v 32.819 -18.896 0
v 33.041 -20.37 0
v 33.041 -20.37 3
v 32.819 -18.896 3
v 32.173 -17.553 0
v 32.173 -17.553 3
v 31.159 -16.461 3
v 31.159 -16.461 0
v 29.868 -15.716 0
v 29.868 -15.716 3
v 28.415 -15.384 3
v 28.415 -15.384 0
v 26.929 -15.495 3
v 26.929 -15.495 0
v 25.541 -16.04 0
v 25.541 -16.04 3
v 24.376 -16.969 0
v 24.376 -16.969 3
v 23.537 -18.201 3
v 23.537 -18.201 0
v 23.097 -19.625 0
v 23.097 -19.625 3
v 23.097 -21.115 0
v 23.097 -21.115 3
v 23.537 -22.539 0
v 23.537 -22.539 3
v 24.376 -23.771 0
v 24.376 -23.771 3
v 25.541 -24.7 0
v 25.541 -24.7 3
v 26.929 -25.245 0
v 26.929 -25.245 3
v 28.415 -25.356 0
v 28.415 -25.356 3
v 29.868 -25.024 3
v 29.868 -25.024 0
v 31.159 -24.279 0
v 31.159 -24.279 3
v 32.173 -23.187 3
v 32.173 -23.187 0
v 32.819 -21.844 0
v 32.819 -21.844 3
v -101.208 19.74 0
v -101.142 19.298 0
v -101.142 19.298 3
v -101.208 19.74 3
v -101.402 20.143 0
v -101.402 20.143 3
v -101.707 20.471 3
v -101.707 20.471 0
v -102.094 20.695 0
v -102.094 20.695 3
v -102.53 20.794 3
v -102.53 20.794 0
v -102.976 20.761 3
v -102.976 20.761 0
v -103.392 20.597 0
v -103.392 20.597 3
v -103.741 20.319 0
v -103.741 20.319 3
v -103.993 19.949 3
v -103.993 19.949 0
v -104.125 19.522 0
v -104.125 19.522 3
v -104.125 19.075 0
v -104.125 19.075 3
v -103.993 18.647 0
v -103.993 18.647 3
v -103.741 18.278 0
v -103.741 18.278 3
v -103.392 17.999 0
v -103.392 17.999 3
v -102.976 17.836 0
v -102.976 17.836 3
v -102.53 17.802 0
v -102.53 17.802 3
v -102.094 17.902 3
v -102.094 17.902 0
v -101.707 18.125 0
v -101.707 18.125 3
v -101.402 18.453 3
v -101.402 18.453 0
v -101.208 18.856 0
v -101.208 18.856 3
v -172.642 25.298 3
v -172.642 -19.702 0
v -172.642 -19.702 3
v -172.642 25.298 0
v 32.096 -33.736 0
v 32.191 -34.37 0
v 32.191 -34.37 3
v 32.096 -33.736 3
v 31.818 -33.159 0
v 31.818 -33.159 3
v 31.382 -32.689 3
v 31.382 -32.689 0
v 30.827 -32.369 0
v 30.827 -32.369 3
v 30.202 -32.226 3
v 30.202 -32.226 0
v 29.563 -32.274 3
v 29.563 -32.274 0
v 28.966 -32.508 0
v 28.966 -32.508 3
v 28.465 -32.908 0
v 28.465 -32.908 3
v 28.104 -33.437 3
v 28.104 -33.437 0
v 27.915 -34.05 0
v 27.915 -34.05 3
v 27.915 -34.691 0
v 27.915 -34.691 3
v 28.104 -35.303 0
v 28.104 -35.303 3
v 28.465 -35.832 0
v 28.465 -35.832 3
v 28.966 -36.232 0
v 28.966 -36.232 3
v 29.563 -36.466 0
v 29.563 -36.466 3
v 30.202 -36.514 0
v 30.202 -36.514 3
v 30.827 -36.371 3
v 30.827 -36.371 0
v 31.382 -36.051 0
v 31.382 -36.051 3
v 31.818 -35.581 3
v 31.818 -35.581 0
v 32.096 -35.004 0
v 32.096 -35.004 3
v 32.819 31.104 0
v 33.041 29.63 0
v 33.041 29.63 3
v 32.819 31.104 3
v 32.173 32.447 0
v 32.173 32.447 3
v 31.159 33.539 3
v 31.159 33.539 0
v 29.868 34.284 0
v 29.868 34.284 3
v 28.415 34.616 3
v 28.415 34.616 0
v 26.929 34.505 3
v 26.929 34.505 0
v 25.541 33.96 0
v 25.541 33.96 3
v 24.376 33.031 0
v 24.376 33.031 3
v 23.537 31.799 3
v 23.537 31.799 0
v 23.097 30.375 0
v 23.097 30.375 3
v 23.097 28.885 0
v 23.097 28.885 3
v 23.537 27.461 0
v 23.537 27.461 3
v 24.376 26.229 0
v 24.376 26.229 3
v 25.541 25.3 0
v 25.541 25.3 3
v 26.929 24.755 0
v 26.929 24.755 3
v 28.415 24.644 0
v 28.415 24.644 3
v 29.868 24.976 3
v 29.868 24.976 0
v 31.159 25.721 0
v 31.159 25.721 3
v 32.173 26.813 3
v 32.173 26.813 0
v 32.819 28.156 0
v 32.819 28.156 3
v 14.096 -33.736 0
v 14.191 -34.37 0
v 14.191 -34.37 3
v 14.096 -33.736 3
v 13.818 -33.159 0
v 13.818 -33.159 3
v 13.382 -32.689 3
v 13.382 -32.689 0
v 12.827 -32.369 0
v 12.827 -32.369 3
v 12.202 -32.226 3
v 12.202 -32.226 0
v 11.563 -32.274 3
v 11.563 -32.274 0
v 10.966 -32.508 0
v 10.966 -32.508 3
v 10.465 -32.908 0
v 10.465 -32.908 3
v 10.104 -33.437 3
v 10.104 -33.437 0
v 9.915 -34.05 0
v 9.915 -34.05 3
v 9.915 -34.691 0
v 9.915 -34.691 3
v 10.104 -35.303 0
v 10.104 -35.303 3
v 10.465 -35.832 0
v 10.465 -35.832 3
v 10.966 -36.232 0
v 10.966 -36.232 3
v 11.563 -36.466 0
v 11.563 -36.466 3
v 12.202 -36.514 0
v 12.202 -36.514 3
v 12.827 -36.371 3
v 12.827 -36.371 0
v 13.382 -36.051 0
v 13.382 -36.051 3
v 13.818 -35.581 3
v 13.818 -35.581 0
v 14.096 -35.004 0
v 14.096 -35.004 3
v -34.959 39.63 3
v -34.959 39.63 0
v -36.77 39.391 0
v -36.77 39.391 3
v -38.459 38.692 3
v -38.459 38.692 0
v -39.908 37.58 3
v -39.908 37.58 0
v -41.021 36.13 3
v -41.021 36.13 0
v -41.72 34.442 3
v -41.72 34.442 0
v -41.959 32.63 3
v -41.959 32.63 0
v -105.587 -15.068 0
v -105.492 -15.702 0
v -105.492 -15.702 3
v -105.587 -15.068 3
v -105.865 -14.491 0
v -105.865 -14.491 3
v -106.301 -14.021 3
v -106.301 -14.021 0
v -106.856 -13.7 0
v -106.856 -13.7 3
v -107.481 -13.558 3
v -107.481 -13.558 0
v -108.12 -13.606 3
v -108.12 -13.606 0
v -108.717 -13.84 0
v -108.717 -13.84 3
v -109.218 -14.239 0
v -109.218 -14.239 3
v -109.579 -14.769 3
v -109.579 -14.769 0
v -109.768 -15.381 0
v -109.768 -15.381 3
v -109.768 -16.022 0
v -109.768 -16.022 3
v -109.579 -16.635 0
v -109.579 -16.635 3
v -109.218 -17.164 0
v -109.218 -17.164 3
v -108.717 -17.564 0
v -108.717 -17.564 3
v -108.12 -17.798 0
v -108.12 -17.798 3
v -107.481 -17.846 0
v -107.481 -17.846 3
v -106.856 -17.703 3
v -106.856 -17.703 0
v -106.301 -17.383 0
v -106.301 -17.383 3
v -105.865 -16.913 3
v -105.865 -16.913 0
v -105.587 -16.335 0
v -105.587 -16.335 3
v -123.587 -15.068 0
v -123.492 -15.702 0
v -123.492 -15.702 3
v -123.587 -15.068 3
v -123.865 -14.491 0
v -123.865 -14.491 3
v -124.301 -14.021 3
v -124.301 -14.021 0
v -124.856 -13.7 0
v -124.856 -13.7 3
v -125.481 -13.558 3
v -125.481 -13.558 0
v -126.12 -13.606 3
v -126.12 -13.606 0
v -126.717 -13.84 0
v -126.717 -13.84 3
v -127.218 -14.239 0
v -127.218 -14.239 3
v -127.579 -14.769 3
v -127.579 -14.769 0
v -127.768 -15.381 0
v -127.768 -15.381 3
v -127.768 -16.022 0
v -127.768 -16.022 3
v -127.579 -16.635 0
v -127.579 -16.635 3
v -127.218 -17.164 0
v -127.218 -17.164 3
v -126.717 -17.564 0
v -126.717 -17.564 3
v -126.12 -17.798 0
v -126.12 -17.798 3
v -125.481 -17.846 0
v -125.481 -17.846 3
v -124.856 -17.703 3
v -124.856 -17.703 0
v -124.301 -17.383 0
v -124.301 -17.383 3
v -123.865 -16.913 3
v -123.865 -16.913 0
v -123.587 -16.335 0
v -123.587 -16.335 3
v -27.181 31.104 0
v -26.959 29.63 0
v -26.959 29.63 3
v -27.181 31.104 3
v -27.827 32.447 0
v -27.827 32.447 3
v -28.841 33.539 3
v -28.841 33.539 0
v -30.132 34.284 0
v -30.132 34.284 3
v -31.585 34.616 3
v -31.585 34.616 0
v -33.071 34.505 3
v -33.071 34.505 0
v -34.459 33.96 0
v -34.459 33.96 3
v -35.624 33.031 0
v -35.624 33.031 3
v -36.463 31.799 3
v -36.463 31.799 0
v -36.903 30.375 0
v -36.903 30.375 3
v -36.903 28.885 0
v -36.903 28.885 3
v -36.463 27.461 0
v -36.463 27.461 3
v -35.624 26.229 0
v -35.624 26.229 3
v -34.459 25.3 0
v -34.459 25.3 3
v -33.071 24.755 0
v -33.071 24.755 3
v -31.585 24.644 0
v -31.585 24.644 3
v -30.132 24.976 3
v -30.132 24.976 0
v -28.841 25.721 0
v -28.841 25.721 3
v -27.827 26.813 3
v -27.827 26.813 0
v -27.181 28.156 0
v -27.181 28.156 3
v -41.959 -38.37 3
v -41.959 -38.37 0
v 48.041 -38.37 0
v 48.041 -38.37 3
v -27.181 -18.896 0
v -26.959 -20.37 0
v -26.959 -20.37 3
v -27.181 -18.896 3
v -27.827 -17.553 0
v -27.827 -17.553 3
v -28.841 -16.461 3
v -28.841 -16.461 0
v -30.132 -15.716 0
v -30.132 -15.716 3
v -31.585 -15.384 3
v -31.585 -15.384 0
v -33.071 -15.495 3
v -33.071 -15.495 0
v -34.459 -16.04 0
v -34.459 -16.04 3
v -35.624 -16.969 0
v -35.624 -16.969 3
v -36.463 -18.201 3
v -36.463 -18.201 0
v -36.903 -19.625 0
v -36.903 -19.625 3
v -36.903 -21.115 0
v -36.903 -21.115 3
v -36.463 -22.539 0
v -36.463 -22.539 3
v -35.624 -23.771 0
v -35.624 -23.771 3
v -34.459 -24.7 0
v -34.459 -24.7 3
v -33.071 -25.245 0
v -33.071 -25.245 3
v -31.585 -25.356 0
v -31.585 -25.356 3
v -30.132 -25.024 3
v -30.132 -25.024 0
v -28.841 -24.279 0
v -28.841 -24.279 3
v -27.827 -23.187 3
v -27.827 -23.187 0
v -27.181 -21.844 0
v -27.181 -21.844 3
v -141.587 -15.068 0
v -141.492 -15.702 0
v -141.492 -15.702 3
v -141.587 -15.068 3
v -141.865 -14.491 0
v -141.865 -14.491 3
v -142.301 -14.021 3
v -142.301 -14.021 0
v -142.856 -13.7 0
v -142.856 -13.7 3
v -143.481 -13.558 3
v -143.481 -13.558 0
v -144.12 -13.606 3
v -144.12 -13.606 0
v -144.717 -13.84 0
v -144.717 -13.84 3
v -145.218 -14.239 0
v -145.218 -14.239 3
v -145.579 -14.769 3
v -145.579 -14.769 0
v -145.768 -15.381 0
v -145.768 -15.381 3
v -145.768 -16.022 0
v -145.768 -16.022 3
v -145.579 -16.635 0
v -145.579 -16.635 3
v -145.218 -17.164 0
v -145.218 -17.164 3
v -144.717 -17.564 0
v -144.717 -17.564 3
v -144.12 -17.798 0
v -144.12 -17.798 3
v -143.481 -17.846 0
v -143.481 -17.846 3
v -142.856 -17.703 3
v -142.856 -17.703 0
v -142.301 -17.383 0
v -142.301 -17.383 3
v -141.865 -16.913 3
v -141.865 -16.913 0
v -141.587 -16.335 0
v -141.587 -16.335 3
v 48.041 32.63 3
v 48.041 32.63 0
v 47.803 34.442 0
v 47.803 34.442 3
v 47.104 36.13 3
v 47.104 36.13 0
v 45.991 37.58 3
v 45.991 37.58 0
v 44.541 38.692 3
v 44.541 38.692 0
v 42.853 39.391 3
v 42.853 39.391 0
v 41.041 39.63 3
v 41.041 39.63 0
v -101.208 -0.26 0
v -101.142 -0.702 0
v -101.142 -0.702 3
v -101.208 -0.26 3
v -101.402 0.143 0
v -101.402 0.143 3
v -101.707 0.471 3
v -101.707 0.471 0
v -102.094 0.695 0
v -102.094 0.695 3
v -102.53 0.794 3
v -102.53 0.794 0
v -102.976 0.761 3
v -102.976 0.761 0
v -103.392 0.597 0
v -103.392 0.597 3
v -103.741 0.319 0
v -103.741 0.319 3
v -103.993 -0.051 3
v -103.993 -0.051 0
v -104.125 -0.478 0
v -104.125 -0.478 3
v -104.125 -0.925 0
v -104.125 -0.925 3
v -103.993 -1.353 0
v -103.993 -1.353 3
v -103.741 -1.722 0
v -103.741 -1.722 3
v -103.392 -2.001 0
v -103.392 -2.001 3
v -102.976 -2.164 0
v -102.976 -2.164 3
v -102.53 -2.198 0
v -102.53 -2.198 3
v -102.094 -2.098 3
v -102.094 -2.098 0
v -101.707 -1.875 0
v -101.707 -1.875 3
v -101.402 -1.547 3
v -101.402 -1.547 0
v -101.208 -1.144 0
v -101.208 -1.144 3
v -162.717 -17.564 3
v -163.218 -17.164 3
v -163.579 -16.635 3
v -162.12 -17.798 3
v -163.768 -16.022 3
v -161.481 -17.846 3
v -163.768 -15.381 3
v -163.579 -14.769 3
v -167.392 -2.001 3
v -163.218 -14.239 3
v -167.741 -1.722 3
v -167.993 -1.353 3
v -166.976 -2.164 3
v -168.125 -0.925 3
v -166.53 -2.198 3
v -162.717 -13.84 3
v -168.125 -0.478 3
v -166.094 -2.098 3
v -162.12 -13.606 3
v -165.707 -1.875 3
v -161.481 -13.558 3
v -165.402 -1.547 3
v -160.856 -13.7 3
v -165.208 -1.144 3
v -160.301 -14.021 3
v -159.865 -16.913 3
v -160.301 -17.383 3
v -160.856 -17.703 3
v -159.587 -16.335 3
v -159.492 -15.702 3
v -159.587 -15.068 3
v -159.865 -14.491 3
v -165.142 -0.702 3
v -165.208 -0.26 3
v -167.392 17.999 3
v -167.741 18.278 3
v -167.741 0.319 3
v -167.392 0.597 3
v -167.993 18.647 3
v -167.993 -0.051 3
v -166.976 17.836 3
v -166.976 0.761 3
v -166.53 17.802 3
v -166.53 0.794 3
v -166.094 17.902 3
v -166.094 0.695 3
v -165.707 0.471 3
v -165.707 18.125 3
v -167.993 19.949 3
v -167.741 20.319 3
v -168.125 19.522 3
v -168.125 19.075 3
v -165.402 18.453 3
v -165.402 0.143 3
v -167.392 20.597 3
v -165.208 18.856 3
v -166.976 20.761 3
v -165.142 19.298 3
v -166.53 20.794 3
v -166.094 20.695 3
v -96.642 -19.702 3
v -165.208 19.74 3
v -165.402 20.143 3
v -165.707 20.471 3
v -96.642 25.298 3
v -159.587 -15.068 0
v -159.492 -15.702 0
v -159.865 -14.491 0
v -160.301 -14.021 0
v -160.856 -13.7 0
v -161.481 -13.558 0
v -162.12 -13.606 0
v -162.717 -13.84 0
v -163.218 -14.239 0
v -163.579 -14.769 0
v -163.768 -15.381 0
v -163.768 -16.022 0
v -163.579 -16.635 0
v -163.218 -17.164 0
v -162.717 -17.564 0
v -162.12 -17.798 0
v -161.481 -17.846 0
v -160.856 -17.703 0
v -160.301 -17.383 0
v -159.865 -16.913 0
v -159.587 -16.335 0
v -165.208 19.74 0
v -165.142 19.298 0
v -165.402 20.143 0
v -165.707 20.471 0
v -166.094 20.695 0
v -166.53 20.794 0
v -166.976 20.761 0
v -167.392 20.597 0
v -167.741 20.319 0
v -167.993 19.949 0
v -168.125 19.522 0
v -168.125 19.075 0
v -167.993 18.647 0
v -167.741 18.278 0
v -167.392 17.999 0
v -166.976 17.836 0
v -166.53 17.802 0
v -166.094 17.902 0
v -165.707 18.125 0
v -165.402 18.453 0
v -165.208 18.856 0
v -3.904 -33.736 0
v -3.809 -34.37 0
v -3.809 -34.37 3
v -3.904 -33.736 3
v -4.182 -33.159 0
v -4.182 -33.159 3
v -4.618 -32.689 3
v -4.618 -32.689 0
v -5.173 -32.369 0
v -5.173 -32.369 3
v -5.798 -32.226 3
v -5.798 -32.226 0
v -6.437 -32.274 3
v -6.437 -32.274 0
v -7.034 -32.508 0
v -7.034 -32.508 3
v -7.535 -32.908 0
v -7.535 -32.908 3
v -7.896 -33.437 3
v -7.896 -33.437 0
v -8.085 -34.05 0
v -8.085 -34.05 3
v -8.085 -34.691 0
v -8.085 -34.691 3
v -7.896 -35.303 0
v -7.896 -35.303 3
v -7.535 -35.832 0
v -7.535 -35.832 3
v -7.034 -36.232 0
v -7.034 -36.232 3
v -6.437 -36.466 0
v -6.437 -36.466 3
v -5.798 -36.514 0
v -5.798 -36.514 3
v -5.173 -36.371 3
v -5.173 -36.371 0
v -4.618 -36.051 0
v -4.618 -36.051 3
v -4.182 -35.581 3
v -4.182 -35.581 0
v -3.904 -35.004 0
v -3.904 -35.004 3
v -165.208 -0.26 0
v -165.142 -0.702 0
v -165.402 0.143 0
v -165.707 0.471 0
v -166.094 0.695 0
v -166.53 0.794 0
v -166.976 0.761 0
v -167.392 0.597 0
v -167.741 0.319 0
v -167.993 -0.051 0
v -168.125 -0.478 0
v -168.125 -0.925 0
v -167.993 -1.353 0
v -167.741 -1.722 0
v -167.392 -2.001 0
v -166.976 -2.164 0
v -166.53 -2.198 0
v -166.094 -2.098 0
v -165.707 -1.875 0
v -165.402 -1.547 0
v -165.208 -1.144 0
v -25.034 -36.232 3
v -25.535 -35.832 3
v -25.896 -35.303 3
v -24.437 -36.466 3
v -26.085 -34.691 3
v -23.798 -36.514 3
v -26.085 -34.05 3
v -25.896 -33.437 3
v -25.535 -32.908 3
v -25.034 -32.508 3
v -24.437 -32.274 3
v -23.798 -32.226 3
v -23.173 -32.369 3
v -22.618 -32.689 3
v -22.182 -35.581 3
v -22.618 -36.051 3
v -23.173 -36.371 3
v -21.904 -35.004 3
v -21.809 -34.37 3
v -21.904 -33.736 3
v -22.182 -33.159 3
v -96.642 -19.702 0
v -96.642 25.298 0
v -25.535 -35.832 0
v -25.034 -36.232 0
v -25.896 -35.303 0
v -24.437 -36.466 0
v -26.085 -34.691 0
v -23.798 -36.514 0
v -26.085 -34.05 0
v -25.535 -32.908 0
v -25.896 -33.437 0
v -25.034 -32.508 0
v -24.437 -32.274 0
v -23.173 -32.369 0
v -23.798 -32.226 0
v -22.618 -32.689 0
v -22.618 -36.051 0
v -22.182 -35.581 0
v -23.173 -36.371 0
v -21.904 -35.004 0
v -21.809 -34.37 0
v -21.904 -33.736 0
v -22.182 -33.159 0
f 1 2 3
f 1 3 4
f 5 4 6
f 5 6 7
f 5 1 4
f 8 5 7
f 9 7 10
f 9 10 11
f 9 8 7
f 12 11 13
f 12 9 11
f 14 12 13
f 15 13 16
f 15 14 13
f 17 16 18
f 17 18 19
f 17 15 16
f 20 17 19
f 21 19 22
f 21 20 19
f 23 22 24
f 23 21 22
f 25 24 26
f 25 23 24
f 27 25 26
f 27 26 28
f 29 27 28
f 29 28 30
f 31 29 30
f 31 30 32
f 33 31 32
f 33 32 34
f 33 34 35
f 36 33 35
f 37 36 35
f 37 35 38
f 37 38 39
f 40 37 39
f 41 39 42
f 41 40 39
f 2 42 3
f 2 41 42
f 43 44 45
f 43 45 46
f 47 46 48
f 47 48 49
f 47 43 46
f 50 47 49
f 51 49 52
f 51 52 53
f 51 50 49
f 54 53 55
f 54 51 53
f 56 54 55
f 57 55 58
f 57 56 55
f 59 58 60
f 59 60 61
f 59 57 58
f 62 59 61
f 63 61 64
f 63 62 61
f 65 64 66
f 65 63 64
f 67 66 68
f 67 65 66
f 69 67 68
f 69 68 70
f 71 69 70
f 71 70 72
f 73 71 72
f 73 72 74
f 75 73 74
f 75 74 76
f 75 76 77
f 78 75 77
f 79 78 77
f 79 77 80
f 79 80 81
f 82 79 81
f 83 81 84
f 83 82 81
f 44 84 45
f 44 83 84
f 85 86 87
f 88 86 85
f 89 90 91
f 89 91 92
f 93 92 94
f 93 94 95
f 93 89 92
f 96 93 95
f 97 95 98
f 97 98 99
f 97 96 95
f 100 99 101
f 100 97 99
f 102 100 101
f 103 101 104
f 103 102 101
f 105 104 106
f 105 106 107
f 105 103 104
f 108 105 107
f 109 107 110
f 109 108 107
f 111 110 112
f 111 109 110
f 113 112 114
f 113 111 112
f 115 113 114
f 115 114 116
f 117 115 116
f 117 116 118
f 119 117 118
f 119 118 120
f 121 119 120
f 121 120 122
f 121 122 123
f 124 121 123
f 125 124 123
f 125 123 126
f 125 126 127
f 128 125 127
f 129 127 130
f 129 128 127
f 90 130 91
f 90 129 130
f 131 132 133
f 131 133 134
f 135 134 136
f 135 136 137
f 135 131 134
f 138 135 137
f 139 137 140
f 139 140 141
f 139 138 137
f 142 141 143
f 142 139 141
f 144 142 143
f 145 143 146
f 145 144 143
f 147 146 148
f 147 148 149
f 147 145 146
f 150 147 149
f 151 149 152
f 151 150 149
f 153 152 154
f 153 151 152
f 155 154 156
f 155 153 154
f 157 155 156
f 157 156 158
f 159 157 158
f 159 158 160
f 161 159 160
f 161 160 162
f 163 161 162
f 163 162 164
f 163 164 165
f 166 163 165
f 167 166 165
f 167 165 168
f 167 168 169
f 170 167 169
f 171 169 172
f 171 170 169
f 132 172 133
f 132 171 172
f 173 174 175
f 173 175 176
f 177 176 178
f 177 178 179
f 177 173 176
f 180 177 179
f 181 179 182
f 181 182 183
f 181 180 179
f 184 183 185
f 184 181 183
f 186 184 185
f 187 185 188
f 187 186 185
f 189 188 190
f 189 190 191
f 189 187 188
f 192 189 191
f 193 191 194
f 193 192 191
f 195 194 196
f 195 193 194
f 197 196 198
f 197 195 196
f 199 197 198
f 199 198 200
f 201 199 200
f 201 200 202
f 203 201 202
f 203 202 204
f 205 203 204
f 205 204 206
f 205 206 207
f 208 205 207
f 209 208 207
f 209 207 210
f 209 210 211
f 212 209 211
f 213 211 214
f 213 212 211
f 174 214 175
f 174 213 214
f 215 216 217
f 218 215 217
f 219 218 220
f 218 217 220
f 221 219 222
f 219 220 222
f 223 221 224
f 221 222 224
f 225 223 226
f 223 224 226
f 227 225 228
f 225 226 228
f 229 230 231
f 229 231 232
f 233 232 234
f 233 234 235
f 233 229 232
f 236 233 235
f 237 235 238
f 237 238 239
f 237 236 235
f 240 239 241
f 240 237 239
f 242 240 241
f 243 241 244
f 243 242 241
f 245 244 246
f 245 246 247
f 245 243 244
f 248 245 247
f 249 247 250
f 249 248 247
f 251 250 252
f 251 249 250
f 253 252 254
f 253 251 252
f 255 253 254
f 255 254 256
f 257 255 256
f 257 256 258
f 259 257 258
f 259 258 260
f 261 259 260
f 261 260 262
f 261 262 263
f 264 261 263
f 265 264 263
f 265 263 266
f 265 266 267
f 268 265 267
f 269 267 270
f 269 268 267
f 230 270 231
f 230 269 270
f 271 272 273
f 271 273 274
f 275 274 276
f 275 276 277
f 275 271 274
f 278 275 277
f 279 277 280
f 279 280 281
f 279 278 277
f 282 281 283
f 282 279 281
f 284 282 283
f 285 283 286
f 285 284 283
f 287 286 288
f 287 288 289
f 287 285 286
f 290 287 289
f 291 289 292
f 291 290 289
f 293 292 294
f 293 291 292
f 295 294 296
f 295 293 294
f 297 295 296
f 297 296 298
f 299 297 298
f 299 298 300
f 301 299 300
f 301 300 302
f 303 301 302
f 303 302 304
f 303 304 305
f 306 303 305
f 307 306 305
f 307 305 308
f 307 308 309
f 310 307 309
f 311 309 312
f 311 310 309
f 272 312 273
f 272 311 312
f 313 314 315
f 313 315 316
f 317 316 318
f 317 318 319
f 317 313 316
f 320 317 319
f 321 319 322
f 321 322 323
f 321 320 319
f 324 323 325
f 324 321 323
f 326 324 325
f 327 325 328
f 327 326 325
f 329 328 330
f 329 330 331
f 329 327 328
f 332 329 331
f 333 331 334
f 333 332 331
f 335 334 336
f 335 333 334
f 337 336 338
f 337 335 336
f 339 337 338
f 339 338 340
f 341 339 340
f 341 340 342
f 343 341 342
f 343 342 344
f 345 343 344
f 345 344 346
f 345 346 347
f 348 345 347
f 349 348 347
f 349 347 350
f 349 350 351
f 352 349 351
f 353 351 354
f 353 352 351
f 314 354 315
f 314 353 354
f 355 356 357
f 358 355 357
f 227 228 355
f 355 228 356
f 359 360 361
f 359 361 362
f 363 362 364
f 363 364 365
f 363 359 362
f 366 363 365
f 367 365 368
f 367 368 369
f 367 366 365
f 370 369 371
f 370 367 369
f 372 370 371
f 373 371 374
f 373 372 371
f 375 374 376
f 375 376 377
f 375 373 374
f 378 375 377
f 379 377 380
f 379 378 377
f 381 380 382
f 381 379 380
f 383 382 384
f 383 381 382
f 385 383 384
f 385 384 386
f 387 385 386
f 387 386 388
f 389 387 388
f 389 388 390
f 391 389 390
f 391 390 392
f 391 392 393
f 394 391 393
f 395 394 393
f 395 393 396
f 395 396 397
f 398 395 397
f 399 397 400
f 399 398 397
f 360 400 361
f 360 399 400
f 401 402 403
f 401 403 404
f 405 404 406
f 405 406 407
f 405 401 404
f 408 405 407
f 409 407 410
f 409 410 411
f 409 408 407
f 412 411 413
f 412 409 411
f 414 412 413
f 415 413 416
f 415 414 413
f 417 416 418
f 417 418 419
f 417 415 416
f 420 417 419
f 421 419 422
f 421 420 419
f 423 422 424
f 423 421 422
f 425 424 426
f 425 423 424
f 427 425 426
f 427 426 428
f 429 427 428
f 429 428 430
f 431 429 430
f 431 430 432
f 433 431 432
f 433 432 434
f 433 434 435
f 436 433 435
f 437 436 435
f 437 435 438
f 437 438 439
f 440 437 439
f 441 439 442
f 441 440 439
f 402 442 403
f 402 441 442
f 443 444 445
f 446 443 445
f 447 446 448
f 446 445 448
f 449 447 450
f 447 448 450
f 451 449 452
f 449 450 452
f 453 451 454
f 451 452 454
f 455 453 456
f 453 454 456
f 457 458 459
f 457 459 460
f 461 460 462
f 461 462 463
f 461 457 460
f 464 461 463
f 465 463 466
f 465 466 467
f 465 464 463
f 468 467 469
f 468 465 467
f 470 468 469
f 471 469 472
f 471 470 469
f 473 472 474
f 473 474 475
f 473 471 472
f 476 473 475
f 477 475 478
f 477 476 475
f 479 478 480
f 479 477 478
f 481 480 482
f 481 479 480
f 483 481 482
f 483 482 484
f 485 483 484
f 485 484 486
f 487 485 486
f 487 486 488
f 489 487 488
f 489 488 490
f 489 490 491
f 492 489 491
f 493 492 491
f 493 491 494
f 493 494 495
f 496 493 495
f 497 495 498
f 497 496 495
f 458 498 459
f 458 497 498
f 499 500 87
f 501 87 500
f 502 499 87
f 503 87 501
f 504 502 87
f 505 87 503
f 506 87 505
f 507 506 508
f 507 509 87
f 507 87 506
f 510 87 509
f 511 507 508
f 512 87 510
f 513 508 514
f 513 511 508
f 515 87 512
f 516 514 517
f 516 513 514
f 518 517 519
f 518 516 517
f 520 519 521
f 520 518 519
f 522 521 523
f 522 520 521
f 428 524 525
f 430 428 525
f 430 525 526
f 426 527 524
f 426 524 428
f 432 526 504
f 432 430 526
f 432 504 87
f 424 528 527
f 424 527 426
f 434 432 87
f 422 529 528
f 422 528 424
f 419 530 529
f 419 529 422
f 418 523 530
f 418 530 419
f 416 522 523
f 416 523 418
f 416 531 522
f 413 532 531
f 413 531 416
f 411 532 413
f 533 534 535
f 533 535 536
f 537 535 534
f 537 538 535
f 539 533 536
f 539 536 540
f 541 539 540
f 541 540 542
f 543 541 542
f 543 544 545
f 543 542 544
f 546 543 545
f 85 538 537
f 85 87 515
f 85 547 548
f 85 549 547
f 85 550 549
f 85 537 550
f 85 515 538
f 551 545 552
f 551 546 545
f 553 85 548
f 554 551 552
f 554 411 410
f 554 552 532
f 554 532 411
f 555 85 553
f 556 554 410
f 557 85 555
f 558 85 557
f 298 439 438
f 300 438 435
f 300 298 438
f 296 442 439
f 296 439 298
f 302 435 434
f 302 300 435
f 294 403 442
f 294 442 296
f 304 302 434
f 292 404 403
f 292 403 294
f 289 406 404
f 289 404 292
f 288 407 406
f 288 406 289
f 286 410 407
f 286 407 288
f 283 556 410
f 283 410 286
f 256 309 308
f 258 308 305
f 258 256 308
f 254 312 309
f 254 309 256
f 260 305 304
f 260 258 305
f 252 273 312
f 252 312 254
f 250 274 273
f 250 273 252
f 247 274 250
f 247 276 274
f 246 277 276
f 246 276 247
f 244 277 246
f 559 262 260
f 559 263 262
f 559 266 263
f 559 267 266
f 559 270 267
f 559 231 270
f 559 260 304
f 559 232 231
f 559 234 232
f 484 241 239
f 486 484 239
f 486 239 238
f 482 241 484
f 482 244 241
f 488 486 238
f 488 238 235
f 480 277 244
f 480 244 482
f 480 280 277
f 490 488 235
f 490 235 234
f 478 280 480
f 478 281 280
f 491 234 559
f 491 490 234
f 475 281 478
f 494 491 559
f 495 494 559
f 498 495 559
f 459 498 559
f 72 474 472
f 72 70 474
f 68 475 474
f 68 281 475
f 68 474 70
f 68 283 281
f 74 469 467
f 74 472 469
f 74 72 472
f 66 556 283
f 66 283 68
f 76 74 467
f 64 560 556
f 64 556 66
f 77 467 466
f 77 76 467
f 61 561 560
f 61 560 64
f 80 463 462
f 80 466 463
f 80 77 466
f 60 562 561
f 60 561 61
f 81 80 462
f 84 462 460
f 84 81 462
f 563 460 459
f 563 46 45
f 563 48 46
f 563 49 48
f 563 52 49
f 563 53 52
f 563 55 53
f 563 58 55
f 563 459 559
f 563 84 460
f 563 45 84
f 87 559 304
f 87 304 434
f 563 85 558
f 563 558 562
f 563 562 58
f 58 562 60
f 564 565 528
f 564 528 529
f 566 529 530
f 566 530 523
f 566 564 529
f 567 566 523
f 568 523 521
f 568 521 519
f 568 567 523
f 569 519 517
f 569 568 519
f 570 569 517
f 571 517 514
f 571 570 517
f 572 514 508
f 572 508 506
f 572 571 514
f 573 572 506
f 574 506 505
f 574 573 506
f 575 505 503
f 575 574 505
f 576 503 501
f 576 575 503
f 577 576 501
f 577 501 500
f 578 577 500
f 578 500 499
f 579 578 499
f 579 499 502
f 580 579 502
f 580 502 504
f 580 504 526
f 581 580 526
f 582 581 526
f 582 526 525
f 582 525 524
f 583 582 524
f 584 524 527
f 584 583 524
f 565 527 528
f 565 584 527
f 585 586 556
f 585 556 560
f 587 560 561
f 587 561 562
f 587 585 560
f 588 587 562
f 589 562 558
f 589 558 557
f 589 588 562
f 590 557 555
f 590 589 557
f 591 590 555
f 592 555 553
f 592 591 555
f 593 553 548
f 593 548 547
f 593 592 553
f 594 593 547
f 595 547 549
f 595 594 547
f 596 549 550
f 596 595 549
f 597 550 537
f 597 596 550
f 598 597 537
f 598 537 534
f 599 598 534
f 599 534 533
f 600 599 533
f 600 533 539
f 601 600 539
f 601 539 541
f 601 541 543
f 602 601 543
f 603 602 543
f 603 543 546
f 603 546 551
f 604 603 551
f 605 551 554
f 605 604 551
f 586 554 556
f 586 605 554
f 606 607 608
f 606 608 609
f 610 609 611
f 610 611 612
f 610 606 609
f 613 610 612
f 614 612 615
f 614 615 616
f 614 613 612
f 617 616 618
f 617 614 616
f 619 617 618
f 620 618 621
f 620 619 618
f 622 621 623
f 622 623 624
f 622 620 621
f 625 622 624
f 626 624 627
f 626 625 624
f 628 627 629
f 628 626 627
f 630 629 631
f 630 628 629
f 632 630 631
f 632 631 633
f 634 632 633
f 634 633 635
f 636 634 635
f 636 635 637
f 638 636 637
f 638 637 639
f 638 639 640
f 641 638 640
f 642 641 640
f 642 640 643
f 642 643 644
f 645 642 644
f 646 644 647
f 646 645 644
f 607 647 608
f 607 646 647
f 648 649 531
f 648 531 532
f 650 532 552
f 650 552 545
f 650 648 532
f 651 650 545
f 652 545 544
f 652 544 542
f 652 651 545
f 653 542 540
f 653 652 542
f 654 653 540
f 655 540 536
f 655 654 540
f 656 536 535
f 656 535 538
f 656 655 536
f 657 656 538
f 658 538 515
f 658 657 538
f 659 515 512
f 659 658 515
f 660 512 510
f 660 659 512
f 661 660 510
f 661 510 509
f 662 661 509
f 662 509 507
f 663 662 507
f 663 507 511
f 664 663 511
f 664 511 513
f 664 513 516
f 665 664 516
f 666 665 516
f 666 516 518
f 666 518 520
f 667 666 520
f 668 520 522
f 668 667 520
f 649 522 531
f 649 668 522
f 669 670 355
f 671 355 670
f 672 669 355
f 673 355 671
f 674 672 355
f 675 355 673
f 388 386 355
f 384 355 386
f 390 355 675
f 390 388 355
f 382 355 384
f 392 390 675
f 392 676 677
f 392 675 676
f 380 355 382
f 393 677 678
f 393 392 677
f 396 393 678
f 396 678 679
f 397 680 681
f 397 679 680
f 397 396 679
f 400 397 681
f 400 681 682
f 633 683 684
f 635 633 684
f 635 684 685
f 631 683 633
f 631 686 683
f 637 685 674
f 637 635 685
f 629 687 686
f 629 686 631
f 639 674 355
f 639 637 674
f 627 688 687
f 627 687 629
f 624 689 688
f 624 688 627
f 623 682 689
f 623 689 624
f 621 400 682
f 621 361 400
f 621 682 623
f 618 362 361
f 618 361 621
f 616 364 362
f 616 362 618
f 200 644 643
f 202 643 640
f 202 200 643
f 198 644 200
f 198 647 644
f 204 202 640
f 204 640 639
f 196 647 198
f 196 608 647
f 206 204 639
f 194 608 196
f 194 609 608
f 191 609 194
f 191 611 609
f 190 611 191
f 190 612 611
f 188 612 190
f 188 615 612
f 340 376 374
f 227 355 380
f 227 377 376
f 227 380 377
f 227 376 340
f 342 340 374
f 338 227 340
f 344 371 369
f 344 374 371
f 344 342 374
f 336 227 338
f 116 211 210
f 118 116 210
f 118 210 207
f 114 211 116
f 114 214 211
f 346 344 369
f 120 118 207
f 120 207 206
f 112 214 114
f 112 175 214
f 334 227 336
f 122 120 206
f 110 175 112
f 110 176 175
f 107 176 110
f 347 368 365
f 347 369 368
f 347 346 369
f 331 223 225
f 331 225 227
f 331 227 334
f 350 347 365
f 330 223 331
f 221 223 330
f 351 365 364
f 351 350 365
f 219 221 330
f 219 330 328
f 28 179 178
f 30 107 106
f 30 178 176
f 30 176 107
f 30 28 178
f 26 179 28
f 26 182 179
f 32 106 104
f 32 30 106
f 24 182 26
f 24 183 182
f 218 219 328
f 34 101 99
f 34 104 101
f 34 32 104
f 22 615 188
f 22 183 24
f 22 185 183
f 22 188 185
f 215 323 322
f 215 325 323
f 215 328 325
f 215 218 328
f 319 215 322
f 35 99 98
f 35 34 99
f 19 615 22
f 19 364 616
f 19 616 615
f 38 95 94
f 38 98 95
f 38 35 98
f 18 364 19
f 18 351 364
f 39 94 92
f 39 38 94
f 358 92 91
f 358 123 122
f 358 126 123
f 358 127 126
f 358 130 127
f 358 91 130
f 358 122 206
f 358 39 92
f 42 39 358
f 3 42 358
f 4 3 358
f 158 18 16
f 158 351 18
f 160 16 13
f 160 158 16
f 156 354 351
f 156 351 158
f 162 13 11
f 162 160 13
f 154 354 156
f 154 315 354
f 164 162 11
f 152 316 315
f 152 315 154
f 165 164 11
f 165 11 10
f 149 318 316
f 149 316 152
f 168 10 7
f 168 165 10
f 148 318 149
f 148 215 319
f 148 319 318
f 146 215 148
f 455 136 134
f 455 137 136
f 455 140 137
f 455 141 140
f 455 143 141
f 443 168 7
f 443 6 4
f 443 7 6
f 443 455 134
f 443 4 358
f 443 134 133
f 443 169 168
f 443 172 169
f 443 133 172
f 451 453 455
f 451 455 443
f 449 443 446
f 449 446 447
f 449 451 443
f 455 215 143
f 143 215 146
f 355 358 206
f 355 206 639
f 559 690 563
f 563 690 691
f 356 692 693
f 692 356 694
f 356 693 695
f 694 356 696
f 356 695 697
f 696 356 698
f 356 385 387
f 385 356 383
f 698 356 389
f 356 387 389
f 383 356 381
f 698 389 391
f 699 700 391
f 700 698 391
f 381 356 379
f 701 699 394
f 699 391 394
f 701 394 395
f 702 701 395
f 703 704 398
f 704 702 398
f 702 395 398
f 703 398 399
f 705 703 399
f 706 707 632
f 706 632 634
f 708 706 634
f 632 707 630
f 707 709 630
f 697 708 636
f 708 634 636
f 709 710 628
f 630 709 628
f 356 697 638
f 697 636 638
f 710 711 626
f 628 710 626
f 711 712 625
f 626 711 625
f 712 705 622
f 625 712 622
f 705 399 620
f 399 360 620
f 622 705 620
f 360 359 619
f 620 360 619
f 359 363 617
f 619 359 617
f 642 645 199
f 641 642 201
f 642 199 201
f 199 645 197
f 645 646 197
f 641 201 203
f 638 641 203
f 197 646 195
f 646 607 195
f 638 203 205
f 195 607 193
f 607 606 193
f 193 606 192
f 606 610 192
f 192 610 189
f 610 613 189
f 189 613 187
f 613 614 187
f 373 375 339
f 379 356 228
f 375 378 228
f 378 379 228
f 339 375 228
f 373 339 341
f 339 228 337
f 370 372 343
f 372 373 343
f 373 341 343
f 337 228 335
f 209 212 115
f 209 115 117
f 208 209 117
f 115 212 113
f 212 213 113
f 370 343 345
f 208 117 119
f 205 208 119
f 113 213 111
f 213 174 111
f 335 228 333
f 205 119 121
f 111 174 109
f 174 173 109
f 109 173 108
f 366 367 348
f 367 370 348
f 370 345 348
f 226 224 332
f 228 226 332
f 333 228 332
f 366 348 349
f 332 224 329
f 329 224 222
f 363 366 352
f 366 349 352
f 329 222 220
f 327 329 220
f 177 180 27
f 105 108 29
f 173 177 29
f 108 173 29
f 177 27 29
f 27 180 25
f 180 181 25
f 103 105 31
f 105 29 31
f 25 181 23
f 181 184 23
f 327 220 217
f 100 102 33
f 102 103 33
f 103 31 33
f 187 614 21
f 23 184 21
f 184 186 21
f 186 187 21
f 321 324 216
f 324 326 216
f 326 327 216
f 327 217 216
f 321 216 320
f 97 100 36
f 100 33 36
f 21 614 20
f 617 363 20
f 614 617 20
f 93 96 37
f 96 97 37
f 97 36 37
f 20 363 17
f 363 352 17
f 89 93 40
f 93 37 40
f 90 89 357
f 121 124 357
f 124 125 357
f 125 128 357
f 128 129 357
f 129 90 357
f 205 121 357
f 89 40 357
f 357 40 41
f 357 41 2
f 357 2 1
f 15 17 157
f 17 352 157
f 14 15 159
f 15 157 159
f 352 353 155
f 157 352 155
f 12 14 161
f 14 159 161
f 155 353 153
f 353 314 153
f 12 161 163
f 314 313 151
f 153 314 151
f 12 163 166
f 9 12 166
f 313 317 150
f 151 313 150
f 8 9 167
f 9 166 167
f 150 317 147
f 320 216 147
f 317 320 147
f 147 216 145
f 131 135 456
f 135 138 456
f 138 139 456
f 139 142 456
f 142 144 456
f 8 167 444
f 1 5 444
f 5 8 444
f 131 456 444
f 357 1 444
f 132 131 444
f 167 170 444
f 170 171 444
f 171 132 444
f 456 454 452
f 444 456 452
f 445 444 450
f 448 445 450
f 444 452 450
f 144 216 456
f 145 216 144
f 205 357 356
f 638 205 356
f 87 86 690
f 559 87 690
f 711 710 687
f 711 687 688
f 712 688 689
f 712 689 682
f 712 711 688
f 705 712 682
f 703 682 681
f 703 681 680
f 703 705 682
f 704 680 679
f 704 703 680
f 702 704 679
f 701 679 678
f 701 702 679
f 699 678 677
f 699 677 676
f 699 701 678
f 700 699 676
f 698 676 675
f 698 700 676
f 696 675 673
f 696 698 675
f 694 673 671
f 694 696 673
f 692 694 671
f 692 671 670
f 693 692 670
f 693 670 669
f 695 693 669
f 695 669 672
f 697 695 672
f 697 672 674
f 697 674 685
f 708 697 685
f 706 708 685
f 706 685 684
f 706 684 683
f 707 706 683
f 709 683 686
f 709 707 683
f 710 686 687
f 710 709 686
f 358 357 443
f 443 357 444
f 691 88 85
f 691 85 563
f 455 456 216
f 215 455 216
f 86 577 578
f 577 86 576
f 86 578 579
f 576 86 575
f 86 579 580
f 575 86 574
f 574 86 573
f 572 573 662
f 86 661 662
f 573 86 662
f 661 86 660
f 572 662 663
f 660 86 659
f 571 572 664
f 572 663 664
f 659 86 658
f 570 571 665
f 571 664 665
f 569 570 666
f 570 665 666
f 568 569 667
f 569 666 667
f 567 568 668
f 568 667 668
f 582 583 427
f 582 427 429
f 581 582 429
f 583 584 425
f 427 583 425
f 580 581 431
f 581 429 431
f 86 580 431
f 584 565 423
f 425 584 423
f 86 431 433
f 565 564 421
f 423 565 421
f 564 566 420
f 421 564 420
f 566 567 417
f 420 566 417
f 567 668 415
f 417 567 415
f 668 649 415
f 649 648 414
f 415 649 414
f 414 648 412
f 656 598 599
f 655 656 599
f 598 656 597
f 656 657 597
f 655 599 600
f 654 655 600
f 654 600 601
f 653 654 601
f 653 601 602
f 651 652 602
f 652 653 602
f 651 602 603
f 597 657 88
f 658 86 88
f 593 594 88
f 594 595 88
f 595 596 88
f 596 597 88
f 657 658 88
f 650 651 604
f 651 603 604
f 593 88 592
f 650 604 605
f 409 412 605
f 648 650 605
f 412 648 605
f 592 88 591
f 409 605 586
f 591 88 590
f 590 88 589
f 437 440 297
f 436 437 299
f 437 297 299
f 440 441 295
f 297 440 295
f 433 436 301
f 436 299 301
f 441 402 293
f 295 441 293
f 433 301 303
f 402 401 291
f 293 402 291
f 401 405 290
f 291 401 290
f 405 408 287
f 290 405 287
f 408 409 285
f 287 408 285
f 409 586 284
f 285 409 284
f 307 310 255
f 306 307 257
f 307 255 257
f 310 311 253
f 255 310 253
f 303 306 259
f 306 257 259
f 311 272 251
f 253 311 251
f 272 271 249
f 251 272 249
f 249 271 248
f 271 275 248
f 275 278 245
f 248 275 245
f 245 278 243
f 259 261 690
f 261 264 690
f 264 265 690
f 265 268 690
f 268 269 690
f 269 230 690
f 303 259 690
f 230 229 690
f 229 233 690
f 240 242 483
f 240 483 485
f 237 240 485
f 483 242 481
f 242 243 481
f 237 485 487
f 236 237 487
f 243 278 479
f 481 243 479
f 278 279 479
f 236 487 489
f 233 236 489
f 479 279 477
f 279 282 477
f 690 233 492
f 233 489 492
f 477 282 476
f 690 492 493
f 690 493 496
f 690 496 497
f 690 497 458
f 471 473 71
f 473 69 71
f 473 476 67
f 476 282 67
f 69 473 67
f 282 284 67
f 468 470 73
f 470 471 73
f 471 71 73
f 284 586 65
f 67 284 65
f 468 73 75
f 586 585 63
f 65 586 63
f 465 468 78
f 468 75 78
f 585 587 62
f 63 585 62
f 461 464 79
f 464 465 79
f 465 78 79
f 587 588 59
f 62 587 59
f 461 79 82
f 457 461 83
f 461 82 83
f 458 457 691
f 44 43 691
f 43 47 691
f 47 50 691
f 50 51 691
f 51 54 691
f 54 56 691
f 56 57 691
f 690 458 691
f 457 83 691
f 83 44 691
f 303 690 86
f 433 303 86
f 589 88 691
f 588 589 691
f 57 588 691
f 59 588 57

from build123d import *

# Parameters (mm, degrees)
F0_R     = 2.15
F0_R_2   = 5
F1_DEPTH = 3
F2_W     = 76
F2_H     = 45
F2_R     = 2.15
F2_R_2   = 1.5
F3_DEPTH = 3


with BuildPart() as f1:
    # F0 (on Top) → F1 (new body)
    with BuildSketch(Plane.XY):
        with BuildLine():
            Line((48.041456, -38.370075), (48.041456, -30.370075))
            Line((48.041456, -30.370075), (48.041456, 32.629925))
            ThreePointArc((48.041456, 32.629925), (45.991203, 37.579672), (41.041456, 39.629925))
            Line((41.041456, 39.629925), (-34.958544, 39.629925))
            ThreePointArc((-34.958544, 39.629925), (-39.908292, 37.579672), (-41.958544, 32.629925))
            Line((-41.958544, 32.629925), (-41.958544, -30.370075))
            Line((-41.958544, -30.370075), (-41.958544, -38.370075))
            Line((-41.958544, -38.370075), (48.041456, -38.370075))
        make_face()
        with Locations((-23.958544, -34.370075)):
            Circle(F0_R, mode=Mode.SUBTRACT)
        with Locations((-31.958544, -20.370075)):
            Circle(F0_R_2, mode=Mode.SUBTRACT)
        with Locations((-5.958544, -34.370075)):
            Circle(F0_R, mode=Mode.SUBTRACT)
        with Locations((12.041456, -34.370075)):
            Circle(F0_R, mode=Mode.SUBTRACT)
        with Locations((30.041456, -34.370075)):
            Circle(F0_R, mode=Mode.SUBTRACT)
        with Locations((28.041456, -20.370075)):
            Circle(F0_R_2, mode=Mode.SUBTRACT)
        with Locations((-31.958544, 29.629925)):
            Circle(F0_R_2, mode=Mode.SUBTRACT)
        with Locations((28.041456, 29.629925)):
            Circle(F0_R_2, mode=Mode.SUBTRACT)
    extrude(amount=F1_DEPTH)


with BuildPart() as f3:
    # F2 (on Top) → F3 (new body)
    with BuildSketch(Plane.XY):
        with Locations((-134.641795, 2.798244)):
            Rectangle(F2_W, F2_H)
        with Locations((-161.641795, -15.701756)):
            Circle(F2_R, mode=Mode.SUBTRACT)
        with Locations((-143.641795, -15.701756)):
            Circle(F2_R, mode=Mode.SUBTRACT)
        with Locations((-166.641795, -0.701756)):
            Circle(F2_R_2, mode=Mode.SUBTRACT)
        with Locations((-125.641795, -15.701756)):
            Circle(F2_R, mode=Mode.SUBTRACT)
        with Locations((-107.641795, -15.701756)):
            Circle(F2_R, mode=Mode.SUBTRACT)
        with Locations((-102.641795, -0.701756)):
            Circle(F2_R_2, mode=Mode.SUBTRACT)
        with Locations((-166.641795, 19.298244)):
            Circle(F2_R_2, mode=Mode.SUBTRACT)
        with Locations((-102.641795, 19.298244)):
            Circle(F2_R_2, mode=Mode.SUBTRACT)
    extrude(amount=F3_DEPTH)


solid = Compound([f1.part, f3.part])
